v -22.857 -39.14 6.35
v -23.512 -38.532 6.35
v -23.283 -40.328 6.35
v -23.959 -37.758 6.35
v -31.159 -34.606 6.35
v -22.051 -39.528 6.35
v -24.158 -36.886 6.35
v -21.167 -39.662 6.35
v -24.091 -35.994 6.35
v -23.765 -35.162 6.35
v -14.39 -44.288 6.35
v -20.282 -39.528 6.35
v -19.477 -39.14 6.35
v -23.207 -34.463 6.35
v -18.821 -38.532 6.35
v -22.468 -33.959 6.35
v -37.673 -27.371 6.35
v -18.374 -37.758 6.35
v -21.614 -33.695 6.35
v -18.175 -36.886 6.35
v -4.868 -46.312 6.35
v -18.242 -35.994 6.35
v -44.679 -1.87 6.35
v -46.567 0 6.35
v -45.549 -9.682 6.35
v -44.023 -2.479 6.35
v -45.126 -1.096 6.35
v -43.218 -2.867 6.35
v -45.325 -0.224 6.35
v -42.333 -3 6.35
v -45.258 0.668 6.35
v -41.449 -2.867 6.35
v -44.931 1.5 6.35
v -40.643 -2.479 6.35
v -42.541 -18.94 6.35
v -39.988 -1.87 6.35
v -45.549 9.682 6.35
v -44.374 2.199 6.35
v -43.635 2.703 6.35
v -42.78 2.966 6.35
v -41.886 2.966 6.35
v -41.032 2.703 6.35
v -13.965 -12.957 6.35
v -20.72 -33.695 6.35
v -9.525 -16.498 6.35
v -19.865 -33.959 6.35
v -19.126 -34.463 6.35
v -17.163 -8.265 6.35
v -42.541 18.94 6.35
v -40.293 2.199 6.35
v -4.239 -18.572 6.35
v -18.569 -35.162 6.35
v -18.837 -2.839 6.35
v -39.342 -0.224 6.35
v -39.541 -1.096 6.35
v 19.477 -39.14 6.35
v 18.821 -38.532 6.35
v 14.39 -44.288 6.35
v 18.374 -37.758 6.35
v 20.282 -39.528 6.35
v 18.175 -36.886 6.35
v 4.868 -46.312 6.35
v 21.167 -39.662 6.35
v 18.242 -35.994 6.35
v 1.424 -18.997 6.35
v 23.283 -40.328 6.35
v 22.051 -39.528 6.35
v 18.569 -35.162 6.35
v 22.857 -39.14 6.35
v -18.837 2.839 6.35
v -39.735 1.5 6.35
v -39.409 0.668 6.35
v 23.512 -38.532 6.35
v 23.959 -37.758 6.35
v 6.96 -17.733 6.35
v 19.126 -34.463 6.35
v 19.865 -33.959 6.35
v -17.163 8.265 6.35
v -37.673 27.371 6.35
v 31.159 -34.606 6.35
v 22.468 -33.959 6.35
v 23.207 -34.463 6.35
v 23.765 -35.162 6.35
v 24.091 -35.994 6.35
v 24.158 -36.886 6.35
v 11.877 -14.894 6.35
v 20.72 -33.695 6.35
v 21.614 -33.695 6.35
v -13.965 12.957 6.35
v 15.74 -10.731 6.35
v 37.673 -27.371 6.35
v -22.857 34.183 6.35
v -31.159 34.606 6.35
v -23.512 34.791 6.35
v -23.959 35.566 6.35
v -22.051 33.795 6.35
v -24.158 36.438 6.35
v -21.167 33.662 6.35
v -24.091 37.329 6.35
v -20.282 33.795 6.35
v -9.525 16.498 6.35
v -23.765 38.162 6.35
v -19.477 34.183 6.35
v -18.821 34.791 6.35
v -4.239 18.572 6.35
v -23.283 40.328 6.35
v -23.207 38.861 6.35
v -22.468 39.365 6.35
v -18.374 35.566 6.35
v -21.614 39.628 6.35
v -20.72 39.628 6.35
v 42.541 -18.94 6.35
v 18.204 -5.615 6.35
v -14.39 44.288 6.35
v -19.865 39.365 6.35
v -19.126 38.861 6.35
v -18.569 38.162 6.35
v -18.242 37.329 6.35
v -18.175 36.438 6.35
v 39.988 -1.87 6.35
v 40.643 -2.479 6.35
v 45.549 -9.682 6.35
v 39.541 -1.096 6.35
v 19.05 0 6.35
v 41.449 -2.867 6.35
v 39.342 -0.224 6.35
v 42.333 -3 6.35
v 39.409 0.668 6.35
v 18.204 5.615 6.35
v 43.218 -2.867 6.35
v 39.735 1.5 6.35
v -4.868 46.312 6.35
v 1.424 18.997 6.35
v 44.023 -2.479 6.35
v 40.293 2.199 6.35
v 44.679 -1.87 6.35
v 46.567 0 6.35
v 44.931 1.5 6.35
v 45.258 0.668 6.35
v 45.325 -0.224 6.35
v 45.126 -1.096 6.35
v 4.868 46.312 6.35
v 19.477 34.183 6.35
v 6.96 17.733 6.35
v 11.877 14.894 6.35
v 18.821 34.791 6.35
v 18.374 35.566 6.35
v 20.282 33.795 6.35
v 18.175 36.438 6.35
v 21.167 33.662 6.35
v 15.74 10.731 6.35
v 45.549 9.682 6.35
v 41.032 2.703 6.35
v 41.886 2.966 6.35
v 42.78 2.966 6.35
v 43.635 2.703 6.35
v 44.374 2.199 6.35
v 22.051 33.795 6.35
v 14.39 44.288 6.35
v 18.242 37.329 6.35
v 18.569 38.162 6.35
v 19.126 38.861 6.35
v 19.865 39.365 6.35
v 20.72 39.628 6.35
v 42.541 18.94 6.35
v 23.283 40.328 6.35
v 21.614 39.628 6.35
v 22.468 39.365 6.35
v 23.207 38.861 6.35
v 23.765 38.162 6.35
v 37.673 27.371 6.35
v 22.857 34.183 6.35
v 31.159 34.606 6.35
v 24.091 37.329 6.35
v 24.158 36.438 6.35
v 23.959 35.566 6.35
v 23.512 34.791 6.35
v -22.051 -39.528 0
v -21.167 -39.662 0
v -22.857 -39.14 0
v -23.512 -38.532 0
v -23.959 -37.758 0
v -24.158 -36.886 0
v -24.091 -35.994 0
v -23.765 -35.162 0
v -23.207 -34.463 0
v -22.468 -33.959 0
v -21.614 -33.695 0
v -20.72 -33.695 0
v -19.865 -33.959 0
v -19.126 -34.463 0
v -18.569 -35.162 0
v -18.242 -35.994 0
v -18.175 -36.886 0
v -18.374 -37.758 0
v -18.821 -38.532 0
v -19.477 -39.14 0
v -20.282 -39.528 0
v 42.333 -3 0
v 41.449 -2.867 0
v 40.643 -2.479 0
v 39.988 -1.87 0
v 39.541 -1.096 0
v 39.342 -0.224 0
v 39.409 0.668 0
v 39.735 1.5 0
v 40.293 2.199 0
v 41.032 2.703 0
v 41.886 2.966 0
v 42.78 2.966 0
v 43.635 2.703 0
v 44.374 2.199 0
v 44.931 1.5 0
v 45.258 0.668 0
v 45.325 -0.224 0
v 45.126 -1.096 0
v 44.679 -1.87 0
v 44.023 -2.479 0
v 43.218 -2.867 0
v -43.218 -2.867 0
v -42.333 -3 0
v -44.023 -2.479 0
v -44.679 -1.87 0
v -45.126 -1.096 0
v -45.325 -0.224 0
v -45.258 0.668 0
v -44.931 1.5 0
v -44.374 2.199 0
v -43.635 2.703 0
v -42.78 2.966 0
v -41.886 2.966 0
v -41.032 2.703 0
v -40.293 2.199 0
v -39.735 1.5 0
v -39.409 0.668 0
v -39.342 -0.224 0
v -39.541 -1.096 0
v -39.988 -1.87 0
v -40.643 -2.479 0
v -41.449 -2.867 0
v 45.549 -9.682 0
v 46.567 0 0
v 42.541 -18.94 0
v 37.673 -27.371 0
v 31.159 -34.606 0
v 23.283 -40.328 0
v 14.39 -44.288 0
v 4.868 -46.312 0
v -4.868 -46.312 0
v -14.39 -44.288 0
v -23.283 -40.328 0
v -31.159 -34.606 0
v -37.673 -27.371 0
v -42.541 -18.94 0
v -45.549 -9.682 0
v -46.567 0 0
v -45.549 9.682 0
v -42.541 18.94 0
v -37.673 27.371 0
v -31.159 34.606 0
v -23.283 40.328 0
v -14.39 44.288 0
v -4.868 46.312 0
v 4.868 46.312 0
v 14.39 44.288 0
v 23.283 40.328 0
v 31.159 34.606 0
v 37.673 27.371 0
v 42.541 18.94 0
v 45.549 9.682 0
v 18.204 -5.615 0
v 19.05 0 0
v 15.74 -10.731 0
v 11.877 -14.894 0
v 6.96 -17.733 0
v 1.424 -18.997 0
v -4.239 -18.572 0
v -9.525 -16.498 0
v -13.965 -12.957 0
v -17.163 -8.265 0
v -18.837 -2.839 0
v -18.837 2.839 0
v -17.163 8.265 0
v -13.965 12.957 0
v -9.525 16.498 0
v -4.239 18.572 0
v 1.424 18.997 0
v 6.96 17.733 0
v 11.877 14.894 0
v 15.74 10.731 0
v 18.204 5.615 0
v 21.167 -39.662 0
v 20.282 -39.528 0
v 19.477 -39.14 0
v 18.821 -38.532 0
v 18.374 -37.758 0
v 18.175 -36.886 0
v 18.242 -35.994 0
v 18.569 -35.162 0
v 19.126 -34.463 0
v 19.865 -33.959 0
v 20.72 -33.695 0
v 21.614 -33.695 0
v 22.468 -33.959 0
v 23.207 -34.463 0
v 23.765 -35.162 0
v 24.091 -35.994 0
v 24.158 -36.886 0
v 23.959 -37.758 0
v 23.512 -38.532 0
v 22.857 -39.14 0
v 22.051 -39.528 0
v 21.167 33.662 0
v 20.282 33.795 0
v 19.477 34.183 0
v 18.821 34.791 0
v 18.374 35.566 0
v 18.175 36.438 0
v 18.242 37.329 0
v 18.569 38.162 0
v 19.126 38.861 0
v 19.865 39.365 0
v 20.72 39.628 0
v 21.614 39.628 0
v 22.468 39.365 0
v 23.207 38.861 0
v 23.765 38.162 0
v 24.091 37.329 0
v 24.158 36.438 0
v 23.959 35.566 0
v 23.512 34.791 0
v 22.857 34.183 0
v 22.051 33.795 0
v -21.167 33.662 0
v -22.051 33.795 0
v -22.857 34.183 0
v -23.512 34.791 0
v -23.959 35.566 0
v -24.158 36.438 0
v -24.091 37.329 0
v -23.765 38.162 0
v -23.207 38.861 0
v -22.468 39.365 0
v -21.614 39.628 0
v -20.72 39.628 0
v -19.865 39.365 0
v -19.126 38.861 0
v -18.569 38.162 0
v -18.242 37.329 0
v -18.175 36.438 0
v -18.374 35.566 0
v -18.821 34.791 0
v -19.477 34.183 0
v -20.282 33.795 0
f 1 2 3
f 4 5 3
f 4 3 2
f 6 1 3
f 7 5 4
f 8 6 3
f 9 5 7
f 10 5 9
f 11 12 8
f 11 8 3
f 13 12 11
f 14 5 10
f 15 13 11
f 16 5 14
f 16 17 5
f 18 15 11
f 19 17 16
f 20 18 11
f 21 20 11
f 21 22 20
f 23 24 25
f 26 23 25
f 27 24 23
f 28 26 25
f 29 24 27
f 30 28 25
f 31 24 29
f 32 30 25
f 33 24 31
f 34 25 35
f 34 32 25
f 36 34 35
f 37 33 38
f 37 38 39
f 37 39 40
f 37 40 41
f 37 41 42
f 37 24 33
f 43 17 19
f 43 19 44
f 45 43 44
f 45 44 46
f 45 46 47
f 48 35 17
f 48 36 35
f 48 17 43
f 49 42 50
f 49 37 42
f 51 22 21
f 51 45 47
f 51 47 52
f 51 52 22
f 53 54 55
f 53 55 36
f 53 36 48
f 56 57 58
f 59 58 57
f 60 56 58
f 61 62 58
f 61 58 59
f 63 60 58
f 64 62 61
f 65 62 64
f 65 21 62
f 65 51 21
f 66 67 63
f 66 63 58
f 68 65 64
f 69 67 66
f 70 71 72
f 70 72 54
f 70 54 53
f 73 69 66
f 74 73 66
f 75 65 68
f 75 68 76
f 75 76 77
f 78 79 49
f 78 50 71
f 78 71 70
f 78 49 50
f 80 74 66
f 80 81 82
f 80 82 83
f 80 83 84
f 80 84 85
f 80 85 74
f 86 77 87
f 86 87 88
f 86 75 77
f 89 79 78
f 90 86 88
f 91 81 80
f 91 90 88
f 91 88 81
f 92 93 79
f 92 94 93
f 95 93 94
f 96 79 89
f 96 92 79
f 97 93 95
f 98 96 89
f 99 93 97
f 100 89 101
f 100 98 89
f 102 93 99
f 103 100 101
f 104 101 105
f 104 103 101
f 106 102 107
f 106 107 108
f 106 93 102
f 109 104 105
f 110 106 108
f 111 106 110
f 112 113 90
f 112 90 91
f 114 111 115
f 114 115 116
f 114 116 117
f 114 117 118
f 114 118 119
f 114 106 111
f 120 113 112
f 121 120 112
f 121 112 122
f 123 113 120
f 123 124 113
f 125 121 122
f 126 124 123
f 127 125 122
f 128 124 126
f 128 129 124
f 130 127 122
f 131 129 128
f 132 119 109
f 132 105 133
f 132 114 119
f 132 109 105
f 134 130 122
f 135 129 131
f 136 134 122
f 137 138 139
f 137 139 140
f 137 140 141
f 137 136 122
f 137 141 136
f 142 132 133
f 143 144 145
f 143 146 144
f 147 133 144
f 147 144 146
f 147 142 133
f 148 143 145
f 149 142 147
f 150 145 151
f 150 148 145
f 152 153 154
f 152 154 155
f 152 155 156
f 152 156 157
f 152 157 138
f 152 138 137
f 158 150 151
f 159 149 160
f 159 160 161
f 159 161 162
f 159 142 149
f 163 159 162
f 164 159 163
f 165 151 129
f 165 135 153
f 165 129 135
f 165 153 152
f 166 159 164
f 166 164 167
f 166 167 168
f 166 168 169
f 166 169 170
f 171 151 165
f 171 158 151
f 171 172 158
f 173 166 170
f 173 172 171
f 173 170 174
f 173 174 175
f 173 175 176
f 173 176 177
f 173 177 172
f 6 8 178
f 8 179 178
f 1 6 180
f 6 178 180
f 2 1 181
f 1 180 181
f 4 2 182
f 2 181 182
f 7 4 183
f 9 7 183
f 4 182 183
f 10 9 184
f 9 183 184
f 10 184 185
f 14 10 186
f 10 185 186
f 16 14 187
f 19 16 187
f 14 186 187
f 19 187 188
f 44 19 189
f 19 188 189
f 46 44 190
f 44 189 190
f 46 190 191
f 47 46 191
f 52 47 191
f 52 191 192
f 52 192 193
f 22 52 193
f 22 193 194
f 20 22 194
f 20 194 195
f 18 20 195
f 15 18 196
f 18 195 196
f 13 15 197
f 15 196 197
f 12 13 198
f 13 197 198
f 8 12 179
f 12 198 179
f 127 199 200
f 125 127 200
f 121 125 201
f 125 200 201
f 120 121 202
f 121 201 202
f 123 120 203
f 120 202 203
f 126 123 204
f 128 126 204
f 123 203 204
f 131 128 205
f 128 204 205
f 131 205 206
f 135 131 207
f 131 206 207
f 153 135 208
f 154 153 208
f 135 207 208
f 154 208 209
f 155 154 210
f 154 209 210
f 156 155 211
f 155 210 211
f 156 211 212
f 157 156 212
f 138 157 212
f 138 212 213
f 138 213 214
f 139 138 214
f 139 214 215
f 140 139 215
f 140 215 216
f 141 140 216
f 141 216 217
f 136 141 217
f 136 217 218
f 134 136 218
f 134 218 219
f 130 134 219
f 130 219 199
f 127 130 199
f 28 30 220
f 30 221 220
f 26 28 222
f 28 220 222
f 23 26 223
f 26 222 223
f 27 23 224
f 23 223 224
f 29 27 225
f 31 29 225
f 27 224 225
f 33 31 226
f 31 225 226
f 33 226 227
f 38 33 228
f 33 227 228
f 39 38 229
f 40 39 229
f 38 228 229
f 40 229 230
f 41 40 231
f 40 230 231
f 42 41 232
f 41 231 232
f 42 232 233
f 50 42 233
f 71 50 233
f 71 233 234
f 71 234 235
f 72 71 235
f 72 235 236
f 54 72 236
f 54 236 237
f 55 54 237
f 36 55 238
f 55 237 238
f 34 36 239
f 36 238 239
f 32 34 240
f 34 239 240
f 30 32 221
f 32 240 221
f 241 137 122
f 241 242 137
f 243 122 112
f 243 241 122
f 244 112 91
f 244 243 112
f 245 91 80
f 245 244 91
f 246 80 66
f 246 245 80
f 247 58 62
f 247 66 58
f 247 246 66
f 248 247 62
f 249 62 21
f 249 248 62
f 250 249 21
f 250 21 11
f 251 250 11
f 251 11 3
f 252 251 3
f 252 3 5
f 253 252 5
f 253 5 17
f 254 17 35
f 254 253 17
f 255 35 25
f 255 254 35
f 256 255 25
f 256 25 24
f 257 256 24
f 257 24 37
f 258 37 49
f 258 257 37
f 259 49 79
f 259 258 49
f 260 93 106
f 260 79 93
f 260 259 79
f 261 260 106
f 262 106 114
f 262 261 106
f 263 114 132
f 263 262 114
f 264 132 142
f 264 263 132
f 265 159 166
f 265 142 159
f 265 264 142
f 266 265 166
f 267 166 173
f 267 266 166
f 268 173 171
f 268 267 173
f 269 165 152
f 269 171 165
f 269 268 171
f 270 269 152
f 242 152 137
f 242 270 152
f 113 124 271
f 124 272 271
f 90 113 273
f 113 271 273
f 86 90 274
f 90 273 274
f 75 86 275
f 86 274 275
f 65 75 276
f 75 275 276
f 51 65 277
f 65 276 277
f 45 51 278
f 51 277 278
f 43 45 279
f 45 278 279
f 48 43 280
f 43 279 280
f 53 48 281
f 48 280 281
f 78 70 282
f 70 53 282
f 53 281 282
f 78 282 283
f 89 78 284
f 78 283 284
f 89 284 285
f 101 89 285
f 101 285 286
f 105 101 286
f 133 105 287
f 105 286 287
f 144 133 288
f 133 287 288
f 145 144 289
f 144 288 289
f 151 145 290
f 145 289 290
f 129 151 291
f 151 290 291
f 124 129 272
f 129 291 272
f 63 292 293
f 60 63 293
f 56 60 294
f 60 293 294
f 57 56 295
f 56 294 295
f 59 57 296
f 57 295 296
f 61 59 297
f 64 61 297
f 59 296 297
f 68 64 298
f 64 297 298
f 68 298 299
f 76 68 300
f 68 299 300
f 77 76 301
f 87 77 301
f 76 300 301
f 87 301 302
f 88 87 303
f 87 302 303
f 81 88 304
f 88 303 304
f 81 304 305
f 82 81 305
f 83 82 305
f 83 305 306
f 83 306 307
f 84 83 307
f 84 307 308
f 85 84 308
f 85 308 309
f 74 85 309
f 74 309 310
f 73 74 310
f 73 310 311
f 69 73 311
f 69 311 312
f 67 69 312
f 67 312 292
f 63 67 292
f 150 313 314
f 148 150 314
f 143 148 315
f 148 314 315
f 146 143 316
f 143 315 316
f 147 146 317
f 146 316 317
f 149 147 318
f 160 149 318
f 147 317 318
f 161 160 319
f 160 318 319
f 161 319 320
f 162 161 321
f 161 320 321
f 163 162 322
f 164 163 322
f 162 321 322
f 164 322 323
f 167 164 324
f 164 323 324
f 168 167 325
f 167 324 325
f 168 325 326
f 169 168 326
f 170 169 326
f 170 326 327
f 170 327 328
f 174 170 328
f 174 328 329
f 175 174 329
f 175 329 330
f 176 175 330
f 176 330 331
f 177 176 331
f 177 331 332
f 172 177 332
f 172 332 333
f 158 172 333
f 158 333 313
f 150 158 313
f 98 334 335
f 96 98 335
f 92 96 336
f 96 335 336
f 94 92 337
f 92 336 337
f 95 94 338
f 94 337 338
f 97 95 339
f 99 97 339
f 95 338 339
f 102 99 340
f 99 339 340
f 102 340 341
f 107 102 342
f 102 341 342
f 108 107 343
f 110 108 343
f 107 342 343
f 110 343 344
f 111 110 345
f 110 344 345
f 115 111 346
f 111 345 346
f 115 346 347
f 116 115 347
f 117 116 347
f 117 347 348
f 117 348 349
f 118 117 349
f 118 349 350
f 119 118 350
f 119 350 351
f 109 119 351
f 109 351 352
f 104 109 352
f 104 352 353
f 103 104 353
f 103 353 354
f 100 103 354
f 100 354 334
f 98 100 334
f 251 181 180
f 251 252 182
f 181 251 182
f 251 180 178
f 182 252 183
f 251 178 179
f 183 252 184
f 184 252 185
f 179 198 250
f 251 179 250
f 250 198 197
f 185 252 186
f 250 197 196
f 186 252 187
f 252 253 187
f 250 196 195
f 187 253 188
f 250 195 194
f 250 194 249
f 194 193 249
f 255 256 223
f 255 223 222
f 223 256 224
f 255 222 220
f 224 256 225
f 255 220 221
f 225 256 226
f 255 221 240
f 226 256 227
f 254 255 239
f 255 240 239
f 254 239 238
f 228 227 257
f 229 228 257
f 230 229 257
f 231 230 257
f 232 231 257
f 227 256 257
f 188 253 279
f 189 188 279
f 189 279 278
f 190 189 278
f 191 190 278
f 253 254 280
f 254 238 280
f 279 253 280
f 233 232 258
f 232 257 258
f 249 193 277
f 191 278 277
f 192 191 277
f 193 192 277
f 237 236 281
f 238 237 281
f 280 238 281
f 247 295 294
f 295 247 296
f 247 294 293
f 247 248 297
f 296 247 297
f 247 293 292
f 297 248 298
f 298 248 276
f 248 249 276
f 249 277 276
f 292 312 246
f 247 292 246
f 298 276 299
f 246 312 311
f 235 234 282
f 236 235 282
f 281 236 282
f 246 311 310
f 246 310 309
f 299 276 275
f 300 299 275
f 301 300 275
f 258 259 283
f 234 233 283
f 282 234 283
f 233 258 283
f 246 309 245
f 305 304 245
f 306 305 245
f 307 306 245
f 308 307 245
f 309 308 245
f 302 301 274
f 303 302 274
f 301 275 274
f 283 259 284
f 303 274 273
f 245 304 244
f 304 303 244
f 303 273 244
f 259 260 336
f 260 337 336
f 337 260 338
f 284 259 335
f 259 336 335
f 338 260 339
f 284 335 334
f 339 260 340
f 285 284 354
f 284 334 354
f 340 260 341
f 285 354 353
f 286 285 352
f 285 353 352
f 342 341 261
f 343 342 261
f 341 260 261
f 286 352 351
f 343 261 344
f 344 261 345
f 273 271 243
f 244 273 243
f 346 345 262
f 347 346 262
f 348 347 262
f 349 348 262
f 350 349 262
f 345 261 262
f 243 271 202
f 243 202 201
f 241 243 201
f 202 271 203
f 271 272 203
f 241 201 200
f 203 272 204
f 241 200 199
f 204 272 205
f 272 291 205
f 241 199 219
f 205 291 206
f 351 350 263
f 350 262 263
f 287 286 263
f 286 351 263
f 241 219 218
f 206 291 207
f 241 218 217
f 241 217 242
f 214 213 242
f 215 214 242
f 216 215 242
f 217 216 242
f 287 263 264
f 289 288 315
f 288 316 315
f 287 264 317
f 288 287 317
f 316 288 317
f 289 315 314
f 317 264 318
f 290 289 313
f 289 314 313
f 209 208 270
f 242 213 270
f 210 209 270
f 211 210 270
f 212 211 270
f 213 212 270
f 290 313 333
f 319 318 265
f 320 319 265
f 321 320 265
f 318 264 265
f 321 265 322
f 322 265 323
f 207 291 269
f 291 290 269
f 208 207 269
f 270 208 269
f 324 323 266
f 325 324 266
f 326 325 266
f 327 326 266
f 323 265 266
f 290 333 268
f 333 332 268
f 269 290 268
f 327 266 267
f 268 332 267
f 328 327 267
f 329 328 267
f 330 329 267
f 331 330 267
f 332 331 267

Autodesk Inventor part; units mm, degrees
ref_plane "YZ Plane" through (0, 0, 0) normal (1, 0, 0) x (0, 1, 0)
ref_plane "XZ Plane" through (0, 0, 0) normal (0, 1, 0) x (-1, 0, 0)
ref_plane "XY Plane" through (0, 0, 0) normal (0, 0, 1) x (1, 0, 0)
sketch "Sketch1" plane through (0, 0, 0) normal (0, 0, 1) x (1, 0, 0)
  circle A0 centre (0, 0) radius 46.5667
  circle A1 centre (0, 0) radius 19.05
  dimension "d0" = 93.1333
  dimension "d1" = 38.1
extrude "Extrusion1" add sketch "Sketch1" along normal blind 6.35
sketch "Sketch2" plane through (0, 0, 6.35) normal (0, 0, 1) x (1, 0, 0)
  line L0 (21.1667, 36.6617) -> (42.3333, 0) construction
  line L1 (42.3333, 0) -> (21.1667, -36.6617) construction
  line L2 (21.1667, -36.6617) -> (-21.1667, -36.6617) construction
  line L3 (-21.1667, -36.6617) -> (-42.3333, 0) construction
  line L4 (-42.3333, 0) -> (-21.1667, 36.6617) construction
  line L5 (-21.1667, 36.6617) -> (21.1667, 36.6617) construction
  line L6 (-21.1667, 36.6617) -> (-23.2833, 40.3279) construction
  circle A0 centre (0, 0) radius 46.5667 construction
  dimension "d4" = 4.2333
hole "Hole1" at (-21.1667, 36.6617, 6.35) at (-42.3333, 0, 6.35) at (-21.1667, -36.6617, 6.35) at (42.3333, 0, 6.35) at (21.1667, -36.6617, 6.35) at (21.1667, 36.6617, 6.35) direction (0, 0, -1) diameter 6 end through all
properties part number "Stator Front"
